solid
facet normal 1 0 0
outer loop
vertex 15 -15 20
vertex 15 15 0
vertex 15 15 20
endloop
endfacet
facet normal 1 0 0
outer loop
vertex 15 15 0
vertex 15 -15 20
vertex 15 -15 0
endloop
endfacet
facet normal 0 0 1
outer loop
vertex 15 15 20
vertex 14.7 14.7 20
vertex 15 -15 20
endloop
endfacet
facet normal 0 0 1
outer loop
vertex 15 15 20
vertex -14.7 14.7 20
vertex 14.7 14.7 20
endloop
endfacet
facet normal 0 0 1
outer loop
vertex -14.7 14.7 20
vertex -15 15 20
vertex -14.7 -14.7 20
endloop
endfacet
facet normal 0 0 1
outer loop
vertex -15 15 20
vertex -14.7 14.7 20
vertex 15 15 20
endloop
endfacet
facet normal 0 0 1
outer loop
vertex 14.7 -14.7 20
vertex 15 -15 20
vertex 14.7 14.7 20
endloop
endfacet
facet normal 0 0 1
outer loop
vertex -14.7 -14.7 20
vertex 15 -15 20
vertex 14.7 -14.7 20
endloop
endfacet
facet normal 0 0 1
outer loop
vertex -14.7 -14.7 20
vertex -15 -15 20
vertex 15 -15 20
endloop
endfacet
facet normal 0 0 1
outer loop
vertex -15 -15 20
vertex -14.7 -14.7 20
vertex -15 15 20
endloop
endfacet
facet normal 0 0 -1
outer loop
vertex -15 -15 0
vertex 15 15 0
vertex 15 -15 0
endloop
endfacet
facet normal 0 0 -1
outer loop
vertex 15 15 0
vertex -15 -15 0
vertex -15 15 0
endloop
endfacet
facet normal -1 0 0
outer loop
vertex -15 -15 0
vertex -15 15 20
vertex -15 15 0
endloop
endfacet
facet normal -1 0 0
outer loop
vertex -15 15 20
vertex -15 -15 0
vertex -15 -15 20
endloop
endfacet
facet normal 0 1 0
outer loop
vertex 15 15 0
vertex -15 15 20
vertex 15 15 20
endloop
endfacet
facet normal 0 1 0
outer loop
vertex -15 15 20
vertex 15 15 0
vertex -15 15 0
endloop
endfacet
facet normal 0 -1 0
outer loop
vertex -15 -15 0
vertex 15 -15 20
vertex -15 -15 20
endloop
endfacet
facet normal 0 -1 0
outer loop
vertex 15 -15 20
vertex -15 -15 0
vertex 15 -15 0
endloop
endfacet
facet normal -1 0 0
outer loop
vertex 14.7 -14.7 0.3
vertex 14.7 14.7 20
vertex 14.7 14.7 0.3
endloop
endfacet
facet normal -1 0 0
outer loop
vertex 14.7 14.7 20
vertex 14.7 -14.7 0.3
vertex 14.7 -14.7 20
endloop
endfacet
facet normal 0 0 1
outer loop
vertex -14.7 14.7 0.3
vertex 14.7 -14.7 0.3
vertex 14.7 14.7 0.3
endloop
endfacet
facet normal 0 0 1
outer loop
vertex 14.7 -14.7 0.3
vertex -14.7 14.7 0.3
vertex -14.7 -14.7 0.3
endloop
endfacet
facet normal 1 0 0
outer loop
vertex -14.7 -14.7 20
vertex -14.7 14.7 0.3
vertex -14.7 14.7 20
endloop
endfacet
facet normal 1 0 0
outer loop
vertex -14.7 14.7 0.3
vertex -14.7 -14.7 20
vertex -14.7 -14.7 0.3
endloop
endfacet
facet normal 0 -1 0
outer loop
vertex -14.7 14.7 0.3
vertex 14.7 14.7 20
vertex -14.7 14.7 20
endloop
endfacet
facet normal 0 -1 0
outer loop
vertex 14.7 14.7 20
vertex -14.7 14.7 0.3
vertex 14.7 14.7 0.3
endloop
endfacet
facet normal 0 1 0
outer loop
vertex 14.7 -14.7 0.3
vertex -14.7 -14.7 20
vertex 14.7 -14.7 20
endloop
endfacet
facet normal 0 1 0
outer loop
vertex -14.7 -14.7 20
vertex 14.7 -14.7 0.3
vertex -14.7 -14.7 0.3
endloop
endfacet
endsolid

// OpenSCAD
width=30;
length=30; 
height=20;
//of walls (must be more than nozzle size)
thickness=.3; 
rounding=0;
empty=1;//[0:No,1:Yes]

difference(){
  rounded_brick(d=[width,length,height],r=rounding);
  if (empty)
  translate([0,0,thickness])
    rounded_brick(d=[width-2*thickness,length-2*thickness,height],r=rounding);
}

module rounded_brick(d=[10,10,10],sides=[1,1,1,1],r=-1,$fn=36){
  module rounded_(d=[10,10,10],sides=[1,1,1,1]){
    if(max(sides)){
      hull()
        for (i=[0:3])
          mirror([floor(i/2),0,0])mirror([0,i%2,0])
            if (sides[i])
              translate([d[0]/2-sides[i],d[1]/2-sides[i],0])
                cylinder(h=d[2],r=sides[i],$fn=$fn);
            else
              translate([d[0]/2-1,d[1]/2-1,0])
                cube([1,1,d[2]]);
    }else
      translate([-d[0]/2,-d[1]/2,0])
        cube(d);
  }
  if(r>=0)
    rounded_(d,[r,r,r,r]);
  else
    rounded_(d,sides);
}
